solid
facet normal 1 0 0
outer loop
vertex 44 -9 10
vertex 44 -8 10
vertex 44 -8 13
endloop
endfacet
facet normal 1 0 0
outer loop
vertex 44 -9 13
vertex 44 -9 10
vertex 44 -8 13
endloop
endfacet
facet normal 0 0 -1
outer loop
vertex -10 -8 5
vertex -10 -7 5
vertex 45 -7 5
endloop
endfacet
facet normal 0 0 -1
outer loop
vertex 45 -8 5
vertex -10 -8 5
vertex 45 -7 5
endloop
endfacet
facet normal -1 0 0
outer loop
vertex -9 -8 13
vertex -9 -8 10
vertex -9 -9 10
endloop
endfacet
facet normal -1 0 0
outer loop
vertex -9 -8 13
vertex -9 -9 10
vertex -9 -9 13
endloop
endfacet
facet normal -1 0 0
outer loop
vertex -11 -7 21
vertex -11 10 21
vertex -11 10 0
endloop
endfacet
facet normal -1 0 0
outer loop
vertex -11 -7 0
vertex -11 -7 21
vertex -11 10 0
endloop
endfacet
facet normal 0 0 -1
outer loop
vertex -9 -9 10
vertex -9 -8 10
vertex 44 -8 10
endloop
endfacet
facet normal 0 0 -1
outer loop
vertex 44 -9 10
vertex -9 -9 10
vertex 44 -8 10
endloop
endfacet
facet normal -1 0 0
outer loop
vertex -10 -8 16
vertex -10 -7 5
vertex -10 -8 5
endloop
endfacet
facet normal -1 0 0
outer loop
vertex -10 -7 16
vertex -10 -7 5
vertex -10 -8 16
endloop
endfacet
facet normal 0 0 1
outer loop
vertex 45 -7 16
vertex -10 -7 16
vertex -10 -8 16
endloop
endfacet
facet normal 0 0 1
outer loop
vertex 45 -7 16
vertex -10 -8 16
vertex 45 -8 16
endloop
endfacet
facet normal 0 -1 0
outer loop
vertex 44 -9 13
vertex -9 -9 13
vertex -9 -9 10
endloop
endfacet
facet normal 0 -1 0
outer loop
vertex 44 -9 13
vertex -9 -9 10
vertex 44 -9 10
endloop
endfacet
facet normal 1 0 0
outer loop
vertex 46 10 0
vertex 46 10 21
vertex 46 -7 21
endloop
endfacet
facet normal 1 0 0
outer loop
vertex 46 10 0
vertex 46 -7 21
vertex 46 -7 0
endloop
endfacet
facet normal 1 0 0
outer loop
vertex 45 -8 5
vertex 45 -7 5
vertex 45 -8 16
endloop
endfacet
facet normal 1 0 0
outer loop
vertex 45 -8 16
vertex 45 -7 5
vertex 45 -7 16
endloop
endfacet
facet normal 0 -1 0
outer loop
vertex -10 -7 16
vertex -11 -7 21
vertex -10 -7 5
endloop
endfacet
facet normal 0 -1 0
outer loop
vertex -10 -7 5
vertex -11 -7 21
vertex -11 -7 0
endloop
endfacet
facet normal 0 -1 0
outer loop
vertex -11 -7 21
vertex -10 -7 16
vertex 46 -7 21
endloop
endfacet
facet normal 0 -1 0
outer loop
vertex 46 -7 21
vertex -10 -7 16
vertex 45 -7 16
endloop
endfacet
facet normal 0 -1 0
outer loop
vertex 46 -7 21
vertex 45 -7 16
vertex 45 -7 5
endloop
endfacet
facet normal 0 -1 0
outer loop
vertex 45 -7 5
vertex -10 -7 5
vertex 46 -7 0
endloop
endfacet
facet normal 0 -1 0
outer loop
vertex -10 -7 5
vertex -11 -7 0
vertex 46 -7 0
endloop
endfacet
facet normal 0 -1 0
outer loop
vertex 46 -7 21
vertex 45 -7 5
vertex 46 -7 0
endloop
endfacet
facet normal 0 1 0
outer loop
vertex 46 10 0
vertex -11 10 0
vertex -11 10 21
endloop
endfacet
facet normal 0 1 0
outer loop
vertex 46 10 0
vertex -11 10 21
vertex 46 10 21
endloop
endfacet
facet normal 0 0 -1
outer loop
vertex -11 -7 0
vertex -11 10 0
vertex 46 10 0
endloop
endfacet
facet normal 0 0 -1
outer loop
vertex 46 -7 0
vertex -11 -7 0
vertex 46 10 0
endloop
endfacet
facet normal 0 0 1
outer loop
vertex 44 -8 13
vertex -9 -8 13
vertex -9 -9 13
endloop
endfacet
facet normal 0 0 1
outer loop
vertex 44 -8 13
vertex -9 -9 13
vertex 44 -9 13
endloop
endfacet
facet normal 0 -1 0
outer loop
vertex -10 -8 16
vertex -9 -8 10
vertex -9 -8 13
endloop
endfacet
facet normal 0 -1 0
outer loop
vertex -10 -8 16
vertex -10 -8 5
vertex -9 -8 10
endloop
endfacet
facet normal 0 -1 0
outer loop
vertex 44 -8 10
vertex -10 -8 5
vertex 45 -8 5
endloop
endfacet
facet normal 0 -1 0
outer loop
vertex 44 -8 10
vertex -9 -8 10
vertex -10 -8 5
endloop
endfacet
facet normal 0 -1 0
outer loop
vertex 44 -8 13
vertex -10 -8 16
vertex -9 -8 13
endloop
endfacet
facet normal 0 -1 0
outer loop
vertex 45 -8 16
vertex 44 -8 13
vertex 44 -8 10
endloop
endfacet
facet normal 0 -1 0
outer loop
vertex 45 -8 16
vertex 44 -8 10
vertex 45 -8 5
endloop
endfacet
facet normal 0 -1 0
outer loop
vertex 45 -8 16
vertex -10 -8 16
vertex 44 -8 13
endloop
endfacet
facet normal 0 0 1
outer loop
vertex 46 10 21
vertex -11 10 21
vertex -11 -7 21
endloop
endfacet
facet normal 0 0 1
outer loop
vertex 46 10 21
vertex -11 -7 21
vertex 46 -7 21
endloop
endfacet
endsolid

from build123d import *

# Parameters (mm, degrees)
CROQUIS1_W              = 57.000000029
CROQUIS1_H              = 20.999999717
SALIENTE_EXTRUIR1_DEPTH = 16.999999993
CROQUIS2_W              = 55.000001564
CROQUIS2_H              = 11.000000872
SALIENTE_EXTRUIR2_DEPTH = 1.000000164
CROQUIS3_W              = 52.999999375
CROQUIS3_H              = 3.000000492
SALIENTE_EXTRUIR3_DEPTH = 0.999999233


with BuildPart() as part:
    # Croquis1 → Saliente-Extruir1 (new body)
    with BuildSketch(Plane(origin=(0, 9.999999776, 0), x_dir=(1, 0, 0), z_dir=(0, 1, 0))):
        with Locations((17.500000075, -10.499999859)):
            Rectangle(CROQUIS1_W, CROQUIS1_H)
    extrude(amount=-SALIENTE_EXTRUIR1_DEPTH)

    # Croquis2 → Saliente-Extruir2 (add)
    with BuildSketch(Plane.XZ.offset(7.000000216)):
        with Locations((17.500001006, 10.500000324)):
            Rectangle(CROQUIS2_W, CROQUIS2_H)
    extrude(amount=SALIENTE_EXTRUIR2_DEPTH)

    # Croquis3 → Saliente-Extruir3 (add)
    with BuildSketch(Plane.XZ.offset(8.00000038)):
        with Locations((17.500000075, 11.500000022)):
            Rectangle(CROQUIS3_W, CROQUIS3_H)
    extrude(amount=SALIENTE_EXTRUIR3_DEPTH)


solid = part.part
